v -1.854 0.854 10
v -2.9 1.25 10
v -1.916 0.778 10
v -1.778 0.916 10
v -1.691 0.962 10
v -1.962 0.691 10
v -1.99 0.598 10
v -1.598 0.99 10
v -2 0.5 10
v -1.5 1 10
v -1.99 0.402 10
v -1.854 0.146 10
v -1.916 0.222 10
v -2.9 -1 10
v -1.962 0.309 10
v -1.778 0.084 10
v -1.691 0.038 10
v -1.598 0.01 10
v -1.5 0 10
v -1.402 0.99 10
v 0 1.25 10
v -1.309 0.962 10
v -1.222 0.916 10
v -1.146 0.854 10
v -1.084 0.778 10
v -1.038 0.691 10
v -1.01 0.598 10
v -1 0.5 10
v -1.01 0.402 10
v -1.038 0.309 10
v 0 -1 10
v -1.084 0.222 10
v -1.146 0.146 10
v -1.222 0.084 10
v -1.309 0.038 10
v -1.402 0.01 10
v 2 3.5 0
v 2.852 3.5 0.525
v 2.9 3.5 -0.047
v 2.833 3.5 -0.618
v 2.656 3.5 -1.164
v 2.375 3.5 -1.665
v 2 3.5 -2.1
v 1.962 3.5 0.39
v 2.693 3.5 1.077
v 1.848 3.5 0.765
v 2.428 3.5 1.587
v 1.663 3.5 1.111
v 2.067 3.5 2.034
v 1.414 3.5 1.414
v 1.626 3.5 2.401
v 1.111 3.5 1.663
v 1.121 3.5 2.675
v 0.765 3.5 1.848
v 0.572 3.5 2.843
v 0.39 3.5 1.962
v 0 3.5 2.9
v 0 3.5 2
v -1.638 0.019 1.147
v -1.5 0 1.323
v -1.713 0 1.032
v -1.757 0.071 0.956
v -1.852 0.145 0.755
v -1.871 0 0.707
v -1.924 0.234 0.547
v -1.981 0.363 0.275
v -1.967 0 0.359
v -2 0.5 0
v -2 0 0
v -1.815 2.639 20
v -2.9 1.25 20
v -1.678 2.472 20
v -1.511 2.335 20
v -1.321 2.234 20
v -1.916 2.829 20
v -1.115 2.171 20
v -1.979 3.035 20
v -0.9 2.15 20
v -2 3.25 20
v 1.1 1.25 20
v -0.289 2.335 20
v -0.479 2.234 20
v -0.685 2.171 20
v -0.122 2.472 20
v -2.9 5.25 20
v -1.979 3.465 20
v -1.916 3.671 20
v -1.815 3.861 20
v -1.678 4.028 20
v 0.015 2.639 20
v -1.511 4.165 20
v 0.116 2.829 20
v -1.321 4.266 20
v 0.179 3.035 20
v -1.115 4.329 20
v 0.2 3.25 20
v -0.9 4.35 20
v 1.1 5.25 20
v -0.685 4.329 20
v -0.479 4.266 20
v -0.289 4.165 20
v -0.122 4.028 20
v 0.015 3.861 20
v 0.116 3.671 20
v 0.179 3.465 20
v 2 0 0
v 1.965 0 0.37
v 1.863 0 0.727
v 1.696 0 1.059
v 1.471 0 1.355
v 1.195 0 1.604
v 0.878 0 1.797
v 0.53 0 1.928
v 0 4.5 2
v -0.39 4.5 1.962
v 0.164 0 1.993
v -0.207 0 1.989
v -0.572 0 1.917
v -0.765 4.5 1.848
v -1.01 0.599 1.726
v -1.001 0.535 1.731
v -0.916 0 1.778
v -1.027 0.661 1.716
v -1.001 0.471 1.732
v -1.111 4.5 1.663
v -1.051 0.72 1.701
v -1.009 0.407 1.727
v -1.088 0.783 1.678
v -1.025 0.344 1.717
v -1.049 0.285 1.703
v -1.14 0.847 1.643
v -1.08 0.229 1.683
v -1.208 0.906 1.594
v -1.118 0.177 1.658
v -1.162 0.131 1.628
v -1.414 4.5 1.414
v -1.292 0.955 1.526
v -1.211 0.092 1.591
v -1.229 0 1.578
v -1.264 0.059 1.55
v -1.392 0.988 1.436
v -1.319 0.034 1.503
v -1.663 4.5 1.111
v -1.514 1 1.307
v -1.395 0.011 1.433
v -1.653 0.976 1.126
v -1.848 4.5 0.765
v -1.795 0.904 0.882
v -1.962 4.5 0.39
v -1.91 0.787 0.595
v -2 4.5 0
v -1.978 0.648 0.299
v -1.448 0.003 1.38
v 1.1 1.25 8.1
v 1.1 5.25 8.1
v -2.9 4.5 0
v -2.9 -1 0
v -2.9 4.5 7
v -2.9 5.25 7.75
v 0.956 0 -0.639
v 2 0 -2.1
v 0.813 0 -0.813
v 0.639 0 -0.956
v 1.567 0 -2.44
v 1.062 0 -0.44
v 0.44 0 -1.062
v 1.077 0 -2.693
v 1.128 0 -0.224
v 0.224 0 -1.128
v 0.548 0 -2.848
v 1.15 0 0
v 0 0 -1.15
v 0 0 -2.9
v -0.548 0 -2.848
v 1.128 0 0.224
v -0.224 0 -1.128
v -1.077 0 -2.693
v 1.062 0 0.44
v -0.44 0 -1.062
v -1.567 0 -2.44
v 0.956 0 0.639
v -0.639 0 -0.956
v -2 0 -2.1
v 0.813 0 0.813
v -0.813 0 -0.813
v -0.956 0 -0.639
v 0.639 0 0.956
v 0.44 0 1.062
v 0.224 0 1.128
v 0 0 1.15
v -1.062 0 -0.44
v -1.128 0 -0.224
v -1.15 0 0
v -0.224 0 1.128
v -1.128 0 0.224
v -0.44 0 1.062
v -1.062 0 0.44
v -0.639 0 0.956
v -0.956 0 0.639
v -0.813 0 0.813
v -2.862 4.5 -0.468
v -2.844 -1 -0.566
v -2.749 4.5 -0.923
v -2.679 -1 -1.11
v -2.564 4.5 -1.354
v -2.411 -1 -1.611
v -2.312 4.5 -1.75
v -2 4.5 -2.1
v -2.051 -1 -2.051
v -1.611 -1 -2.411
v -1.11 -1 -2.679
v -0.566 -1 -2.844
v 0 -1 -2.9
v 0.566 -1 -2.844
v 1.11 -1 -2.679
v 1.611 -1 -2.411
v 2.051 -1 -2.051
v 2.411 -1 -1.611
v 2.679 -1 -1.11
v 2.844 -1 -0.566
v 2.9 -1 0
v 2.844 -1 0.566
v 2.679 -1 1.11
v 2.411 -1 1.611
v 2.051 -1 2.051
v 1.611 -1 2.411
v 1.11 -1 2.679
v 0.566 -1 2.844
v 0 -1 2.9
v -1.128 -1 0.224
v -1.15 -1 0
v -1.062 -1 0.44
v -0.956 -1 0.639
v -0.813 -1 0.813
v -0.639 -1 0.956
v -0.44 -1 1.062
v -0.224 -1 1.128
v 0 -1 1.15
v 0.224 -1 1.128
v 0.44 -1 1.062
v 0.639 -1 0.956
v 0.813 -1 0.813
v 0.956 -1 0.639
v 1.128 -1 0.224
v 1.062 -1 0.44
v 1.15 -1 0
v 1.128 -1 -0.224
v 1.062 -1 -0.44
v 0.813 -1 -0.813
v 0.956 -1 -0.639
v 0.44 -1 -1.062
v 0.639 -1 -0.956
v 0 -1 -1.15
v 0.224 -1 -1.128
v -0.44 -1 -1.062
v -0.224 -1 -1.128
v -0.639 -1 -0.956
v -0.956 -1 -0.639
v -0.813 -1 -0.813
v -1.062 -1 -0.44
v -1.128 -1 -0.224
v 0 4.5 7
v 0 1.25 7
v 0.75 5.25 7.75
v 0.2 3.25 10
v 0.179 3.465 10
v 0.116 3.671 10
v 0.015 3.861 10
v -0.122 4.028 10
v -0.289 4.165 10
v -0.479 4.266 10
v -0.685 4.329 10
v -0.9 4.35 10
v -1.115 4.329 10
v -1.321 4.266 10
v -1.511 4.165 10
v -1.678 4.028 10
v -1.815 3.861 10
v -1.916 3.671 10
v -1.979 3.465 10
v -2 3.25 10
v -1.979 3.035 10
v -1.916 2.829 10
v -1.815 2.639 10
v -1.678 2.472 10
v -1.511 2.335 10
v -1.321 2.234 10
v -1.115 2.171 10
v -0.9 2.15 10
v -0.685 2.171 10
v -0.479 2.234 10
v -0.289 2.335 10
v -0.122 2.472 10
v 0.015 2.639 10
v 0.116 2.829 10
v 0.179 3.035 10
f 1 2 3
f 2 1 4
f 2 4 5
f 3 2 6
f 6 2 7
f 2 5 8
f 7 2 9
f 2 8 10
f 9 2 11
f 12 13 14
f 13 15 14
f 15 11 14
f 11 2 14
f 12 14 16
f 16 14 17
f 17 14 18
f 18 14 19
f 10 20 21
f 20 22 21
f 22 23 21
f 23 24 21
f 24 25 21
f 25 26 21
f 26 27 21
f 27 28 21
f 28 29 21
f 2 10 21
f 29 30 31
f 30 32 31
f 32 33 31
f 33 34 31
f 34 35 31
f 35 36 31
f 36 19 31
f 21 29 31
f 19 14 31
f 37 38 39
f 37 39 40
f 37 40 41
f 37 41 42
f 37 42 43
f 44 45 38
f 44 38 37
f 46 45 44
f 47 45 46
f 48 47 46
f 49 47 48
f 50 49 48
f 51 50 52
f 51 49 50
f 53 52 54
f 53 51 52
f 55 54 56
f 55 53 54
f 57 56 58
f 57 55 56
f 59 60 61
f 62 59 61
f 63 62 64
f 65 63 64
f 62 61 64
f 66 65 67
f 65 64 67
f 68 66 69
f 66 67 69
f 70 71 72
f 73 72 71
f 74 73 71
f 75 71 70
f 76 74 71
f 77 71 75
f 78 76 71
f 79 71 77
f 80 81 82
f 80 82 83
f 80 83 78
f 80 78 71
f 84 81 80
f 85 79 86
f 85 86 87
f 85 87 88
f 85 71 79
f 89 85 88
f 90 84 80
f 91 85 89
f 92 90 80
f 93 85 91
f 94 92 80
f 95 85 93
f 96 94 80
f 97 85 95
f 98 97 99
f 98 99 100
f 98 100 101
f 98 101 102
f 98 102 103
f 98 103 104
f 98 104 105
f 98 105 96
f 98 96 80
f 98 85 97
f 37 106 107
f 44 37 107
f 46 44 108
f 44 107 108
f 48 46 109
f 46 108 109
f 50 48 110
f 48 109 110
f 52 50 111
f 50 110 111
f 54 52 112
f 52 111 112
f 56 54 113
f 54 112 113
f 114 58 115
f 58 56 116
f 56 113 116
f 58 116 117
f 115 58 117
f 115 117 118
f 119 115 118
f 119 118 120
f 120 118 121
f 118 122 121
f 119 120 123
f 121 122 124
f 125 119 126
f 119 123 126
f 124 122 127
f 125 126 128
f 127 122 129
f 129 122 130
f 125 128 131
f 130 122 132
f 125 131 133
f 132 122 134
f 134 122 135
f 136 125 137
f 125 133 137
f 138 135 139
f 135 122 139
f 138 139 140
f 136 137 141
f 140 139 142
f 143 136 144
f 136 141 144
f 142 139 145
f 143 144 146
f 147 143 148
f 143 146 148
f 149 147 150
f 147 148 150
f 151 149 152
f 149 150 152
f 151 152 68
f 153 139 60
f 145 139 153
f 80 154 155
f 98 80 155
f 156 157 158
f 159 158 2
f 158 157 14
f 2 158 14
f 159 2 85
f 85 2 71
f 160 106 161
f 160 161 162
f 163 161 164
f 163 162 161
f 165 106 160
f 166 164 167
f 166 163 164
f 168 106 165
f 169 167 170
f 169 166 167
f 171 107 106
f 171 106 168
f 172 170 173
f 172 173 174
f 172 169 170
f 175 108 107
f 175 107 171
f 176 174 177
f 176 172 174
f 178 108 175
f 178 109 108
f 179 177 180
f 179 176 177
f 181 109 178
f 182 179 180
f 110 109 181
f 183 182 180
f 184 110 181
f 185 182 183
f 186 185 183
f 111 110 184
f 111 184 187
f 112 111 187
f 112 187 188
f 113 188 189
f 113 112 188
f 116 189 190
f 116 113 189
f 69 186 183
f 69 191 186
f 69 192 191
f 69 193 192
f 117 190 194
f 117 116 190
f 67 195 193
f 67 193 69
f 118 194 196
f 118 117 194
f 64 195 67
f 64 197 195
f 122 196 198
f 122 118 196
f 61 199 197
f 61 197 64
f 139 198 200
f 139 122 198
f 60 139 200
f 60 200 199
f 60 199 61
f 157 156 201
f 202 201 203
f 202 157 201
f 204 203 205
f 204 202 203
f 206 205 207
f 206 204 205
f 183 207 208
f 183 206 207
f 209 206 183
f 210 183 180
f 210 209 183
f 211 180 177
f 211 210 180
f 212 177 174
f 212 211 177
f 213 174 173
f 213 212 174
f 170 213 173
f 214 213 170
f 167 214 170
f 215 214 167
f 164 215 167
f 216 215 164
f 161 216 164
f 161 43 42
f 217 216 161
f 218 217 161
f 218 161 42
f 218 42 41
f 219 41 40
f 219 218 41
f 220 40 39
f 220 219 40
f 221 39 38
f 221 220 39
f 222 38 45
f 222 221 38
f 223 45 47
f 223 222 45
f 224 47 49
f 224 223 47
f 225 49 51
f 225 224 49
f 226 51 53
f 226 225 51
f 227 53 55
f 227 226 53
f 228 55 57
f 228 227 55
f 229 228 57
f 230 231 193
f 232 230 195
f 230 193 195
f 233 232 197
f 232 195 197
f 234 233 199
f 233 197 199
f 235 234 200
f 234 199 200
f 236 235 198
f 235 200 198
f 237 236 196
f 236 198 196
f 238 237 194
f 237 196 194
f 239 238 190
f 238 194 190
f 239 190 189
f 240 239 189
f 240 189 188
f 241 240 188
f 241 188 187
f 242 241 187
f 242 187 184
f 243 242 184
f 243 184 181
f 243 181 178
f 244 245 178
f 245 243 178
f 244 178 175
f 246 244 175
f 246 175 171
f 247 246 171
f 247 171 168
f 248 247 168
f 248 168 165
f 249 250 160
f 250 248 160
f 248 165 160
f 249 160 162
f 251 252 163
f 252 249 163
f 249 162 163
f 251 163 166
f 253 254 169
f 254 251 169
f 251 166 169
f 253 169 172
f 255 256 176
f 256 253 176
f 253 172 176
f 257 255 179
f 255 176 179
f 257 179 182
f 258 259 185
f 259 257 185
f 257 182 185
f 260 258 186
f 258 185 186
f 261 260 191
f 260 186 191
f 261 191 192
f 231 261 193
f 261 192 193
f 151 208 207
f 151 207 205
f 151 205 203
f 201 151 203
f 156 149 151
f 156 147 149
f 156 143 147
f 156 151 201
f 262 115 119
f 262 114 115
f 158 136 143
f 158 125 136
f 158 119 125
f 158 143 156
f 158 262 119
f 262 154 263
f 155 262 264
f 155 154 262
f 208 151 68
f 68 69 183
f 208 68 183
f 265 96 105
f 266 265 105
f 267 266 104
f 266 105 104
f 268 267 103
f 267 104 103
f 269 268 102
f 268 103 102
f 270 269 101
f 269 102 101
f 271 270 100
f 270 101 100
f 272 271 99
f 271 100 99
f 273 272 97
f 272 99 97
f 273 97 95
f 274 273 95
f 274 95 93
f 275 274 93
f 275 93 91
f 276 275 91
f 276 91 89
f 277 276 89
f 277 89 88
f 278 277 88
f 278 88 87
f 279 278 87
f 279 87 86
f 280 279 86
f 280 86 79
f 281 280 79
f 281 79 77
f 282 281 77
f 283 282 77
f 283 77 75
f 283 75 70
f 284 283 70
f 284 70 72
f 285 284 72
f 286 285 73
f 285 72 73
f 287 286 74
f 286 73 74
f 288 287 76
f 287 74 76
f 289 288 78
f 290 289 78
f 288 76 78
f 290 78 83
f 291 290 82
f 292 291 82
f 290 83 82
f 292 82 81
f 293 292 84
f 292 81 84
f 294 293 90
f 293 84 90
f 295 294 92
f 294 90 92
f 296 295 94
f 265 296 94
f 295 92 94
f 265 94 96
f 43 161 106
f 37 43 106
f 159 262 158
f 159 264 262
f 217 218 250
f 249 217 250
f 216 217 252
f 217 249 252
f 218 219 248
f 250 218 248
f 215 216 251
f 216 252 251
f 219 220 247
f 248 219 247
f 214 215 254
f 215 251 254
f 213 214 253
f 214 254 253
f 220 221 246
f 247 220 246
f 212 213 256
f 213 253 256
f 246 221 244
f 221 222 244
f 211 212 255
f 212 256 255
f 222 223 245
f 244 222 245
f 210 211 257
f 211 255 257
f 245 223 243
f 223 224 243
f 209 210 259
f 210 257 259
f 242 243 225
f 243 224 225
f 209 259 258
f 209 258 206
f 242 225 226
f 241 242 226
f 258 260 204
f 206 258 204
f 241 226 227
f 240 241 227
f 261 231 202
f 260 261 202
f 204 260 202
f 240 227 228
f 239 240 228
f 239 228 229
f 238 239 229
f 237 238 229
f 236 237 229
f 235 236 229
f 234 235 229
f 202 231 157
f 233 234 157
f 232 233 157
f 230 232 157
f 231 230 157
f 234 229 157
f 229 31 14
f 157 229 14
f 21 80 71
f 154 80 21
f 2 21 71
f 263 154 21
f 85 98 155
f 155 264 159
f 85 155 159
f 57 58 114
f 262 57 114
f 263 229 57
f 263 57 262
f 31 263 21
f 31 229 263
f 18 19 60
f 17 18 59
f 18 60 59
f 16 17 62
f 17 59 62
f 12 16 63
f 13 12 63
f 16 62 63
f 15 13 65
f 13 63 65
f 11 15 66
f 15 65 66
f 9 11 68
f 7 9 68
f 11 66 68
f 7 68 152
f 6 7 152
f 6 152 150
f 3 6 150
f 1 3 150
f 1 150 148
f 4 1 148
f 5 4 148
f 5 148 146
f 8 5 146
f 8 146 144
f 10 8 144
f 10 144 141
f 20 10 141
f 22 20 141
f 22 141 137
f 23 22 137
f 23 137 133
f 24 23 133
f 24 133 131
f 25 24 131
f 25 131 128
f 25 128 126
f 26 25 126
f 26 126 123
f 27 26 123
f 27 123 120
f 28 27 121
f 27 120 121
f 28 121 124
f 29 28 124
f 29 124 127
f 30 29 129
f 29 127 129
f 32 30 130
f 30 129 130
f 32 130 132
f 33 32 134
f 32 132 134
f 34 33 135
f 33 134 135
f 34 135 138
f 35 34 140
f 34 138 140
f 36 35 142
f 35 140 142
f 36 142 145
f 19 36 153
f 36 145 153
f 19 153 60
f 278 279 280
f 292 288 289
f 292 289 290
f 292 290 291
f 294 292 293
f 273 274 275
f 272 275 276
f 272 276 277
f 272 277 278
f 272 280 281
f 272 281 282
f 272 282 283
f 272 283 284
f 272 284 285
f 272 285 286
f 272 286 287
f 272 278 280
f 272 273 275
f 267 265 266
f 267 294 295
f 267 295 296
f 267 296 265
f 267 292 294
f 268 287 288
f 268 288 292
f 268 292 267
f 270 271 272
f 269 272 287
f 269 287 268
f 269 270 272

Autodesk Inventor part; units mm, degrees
ref_plane "YZ Plane" through (0, 0, 0) normal (1, 0, 0) x (0, 1, 0)
ref_plane "XZ Plane" through (0, 0, 0) normal (0, 1, 0) x (-1, 0, 0)
ref_plane "XY Plane" through (0, 0, 0) normal (0, 0, 1) x (1, 0, 0)
sketch "スケッチ1" plane through (0, 0, 0) normal (0, 1, 0) x (-1, 0, 0)
  circle A0 centre (0, 0) radius 1.15
  circle A1 centre (0, 0) radius 2
  circle A2 centre (0, 0) radius 2.9
  line L0 (-2, 0) -> (2, 0)
  line L1 (2, 0) -> (2, -2.9)
  line L2 (2, -2.9) -> (-2, -2.9)
  line L3 (-2, -2.9) -> (-2, 0)
  line L4 (0, 0) -> (0, 2.9)
  line L5 (0, 0) -> (2.9, 0)
  line L6 (2.9, 0) -> (2.9, 10)
  line L7 (2.9, 10) -> (0, 10)
  line L8 (0, 10) -> (0, 0)
  point P0 (0, 2)
  point P1 (2, -2.1)
  point P2 (-2, -2.1)
  dimension "d1" = 4
  dimension "d2" = 5.8
  dimension "d0" = 2.3
  dimension "d3" = 10
extrude "押し出し1" add sketch "スケッチ1" along normal blind 4.5 contours L5 A2 L1 | A1 L4 A2 L5 | A2 L8 L7 L6
extrude "押し出し2" add sketch "スケッチ1" along normal blind 3.5 contours A1 L3 A2 L4
extrude "押し出し3" add sketch "スケッチ1" against normal blind 1 contours L0 A1 A0 | A0 L4 A1 L0 | A0 L0 A1 L4 | L1 A2 L3 A1 | L5 A2 L1 | A1 L4 A2 L5 | A1 L3 A2 L4 | A2 L8 L7 L6
sketch "スケッチ2" plane through (-2.9, 4.5, 10) normal (0, 0, 1) x (1, 0, 0)
  line L0 (2.9, -4.5) -> (1.4, -4.5)
  line L1 (1.4, -4.5) -> (1.4, -4)
  line L2 (1.4, -4) -> (2.9, -4)
  line L3 (2.9, -4) -> (2.9, -4.5)
  dimension "d10" = 1.5
  dimension "d11" = 0.5
hole "穴1" at (-1.5, 0.5, 10) direction (0, 0, -1) diameter 1 end through all
sketch "スケッチ3" plane through (-2.9, 4.5, 10) normal (0, 0, 1) x (1, 0, 0)
  line L0 (0.9, 0) -> (0, 0) projected
  line L1 (0, 0) -> (4, 0)
  line L2 (4, 0) -> (4, -4)
  line L3 (4, -4) -> (0, -4)
  line L4 (0, -4) -> (0, 0)
  line L5 (0, 0) -> (3.25, 0)
  line L6 (3.25, 0) -> (3.25, -3.25)
  line L7 (3.25, -3.25) -> (0, -3.25)
  line L8 (0, -3.25) -> (0, 0)
  line L9 (0, 0) -> (1.625, 0)
  line L10 (1.625, 0) -> (1.625, -1.625)
  line L11 (1.625, -1.625) -> (0, -1.625)
  line L12 (0, -1.625) -> (0, 0)
  line L13 (0, -3.25) -> (4, -3.25)
  line L14 (4, -3.25) -> (4, 0.75)
  line L15 (4, 0.75) -> (0, 0.75)
  line L16 (0, 0.75) -> (0, -3.25)
  point P0 (2.9, -4.5)
  dimension "d19" = 4
  dimension "d20" = 4
  dimension "d21" = 3.25
  dimension "d22" = 3.25
  dimension "d33" = 4
  dimension "d34" = 4
extrude "押し出し4" add sketch "スケッチ3" along normal blind 10 and the other way blind 3 contours L1 L10 L11 L4 L0 | L0 L16 L15 L14 L1 | L1 L6 L7 L4 L11 L10 | L1 L2 L13 L6
chamfer "面取り1" distance 0.75 angle 45 1 edges at (-0.9, 5.25, 7)
chamfer "面取り2" distance 1.1 angle 45 1 edges at (1.1, 2.8752, 7)
sketch "スケッチ6" plane through (-2.9, 4.5, 20) normal (0, 0, 1) x (1, 0, 0)
  line L0 (0, 0) -> (0, 0.75) projected
  line L1 (0, 0.75) -> (2, 0.75)
  line L2 (2, 0.75) -> (2, -1.25)
  line L3 (2, -1.25) -> (0, -1.25)
  line L4 (0, -1.25) -> (0, 0.75)
  circle A0 centre (2, -1.25) radius 1.1
  point P0 (2.9, -4.5)
  dimension "d41" = 2
  dimension "d42" = 2
  dimension "d43" = 2.2
extrude "押し出し6" cut sketch "スケッチ6" against normal blind 10 contours A0 L2 L3 | L3 L2 A0
properties part number "srod1.6right"
